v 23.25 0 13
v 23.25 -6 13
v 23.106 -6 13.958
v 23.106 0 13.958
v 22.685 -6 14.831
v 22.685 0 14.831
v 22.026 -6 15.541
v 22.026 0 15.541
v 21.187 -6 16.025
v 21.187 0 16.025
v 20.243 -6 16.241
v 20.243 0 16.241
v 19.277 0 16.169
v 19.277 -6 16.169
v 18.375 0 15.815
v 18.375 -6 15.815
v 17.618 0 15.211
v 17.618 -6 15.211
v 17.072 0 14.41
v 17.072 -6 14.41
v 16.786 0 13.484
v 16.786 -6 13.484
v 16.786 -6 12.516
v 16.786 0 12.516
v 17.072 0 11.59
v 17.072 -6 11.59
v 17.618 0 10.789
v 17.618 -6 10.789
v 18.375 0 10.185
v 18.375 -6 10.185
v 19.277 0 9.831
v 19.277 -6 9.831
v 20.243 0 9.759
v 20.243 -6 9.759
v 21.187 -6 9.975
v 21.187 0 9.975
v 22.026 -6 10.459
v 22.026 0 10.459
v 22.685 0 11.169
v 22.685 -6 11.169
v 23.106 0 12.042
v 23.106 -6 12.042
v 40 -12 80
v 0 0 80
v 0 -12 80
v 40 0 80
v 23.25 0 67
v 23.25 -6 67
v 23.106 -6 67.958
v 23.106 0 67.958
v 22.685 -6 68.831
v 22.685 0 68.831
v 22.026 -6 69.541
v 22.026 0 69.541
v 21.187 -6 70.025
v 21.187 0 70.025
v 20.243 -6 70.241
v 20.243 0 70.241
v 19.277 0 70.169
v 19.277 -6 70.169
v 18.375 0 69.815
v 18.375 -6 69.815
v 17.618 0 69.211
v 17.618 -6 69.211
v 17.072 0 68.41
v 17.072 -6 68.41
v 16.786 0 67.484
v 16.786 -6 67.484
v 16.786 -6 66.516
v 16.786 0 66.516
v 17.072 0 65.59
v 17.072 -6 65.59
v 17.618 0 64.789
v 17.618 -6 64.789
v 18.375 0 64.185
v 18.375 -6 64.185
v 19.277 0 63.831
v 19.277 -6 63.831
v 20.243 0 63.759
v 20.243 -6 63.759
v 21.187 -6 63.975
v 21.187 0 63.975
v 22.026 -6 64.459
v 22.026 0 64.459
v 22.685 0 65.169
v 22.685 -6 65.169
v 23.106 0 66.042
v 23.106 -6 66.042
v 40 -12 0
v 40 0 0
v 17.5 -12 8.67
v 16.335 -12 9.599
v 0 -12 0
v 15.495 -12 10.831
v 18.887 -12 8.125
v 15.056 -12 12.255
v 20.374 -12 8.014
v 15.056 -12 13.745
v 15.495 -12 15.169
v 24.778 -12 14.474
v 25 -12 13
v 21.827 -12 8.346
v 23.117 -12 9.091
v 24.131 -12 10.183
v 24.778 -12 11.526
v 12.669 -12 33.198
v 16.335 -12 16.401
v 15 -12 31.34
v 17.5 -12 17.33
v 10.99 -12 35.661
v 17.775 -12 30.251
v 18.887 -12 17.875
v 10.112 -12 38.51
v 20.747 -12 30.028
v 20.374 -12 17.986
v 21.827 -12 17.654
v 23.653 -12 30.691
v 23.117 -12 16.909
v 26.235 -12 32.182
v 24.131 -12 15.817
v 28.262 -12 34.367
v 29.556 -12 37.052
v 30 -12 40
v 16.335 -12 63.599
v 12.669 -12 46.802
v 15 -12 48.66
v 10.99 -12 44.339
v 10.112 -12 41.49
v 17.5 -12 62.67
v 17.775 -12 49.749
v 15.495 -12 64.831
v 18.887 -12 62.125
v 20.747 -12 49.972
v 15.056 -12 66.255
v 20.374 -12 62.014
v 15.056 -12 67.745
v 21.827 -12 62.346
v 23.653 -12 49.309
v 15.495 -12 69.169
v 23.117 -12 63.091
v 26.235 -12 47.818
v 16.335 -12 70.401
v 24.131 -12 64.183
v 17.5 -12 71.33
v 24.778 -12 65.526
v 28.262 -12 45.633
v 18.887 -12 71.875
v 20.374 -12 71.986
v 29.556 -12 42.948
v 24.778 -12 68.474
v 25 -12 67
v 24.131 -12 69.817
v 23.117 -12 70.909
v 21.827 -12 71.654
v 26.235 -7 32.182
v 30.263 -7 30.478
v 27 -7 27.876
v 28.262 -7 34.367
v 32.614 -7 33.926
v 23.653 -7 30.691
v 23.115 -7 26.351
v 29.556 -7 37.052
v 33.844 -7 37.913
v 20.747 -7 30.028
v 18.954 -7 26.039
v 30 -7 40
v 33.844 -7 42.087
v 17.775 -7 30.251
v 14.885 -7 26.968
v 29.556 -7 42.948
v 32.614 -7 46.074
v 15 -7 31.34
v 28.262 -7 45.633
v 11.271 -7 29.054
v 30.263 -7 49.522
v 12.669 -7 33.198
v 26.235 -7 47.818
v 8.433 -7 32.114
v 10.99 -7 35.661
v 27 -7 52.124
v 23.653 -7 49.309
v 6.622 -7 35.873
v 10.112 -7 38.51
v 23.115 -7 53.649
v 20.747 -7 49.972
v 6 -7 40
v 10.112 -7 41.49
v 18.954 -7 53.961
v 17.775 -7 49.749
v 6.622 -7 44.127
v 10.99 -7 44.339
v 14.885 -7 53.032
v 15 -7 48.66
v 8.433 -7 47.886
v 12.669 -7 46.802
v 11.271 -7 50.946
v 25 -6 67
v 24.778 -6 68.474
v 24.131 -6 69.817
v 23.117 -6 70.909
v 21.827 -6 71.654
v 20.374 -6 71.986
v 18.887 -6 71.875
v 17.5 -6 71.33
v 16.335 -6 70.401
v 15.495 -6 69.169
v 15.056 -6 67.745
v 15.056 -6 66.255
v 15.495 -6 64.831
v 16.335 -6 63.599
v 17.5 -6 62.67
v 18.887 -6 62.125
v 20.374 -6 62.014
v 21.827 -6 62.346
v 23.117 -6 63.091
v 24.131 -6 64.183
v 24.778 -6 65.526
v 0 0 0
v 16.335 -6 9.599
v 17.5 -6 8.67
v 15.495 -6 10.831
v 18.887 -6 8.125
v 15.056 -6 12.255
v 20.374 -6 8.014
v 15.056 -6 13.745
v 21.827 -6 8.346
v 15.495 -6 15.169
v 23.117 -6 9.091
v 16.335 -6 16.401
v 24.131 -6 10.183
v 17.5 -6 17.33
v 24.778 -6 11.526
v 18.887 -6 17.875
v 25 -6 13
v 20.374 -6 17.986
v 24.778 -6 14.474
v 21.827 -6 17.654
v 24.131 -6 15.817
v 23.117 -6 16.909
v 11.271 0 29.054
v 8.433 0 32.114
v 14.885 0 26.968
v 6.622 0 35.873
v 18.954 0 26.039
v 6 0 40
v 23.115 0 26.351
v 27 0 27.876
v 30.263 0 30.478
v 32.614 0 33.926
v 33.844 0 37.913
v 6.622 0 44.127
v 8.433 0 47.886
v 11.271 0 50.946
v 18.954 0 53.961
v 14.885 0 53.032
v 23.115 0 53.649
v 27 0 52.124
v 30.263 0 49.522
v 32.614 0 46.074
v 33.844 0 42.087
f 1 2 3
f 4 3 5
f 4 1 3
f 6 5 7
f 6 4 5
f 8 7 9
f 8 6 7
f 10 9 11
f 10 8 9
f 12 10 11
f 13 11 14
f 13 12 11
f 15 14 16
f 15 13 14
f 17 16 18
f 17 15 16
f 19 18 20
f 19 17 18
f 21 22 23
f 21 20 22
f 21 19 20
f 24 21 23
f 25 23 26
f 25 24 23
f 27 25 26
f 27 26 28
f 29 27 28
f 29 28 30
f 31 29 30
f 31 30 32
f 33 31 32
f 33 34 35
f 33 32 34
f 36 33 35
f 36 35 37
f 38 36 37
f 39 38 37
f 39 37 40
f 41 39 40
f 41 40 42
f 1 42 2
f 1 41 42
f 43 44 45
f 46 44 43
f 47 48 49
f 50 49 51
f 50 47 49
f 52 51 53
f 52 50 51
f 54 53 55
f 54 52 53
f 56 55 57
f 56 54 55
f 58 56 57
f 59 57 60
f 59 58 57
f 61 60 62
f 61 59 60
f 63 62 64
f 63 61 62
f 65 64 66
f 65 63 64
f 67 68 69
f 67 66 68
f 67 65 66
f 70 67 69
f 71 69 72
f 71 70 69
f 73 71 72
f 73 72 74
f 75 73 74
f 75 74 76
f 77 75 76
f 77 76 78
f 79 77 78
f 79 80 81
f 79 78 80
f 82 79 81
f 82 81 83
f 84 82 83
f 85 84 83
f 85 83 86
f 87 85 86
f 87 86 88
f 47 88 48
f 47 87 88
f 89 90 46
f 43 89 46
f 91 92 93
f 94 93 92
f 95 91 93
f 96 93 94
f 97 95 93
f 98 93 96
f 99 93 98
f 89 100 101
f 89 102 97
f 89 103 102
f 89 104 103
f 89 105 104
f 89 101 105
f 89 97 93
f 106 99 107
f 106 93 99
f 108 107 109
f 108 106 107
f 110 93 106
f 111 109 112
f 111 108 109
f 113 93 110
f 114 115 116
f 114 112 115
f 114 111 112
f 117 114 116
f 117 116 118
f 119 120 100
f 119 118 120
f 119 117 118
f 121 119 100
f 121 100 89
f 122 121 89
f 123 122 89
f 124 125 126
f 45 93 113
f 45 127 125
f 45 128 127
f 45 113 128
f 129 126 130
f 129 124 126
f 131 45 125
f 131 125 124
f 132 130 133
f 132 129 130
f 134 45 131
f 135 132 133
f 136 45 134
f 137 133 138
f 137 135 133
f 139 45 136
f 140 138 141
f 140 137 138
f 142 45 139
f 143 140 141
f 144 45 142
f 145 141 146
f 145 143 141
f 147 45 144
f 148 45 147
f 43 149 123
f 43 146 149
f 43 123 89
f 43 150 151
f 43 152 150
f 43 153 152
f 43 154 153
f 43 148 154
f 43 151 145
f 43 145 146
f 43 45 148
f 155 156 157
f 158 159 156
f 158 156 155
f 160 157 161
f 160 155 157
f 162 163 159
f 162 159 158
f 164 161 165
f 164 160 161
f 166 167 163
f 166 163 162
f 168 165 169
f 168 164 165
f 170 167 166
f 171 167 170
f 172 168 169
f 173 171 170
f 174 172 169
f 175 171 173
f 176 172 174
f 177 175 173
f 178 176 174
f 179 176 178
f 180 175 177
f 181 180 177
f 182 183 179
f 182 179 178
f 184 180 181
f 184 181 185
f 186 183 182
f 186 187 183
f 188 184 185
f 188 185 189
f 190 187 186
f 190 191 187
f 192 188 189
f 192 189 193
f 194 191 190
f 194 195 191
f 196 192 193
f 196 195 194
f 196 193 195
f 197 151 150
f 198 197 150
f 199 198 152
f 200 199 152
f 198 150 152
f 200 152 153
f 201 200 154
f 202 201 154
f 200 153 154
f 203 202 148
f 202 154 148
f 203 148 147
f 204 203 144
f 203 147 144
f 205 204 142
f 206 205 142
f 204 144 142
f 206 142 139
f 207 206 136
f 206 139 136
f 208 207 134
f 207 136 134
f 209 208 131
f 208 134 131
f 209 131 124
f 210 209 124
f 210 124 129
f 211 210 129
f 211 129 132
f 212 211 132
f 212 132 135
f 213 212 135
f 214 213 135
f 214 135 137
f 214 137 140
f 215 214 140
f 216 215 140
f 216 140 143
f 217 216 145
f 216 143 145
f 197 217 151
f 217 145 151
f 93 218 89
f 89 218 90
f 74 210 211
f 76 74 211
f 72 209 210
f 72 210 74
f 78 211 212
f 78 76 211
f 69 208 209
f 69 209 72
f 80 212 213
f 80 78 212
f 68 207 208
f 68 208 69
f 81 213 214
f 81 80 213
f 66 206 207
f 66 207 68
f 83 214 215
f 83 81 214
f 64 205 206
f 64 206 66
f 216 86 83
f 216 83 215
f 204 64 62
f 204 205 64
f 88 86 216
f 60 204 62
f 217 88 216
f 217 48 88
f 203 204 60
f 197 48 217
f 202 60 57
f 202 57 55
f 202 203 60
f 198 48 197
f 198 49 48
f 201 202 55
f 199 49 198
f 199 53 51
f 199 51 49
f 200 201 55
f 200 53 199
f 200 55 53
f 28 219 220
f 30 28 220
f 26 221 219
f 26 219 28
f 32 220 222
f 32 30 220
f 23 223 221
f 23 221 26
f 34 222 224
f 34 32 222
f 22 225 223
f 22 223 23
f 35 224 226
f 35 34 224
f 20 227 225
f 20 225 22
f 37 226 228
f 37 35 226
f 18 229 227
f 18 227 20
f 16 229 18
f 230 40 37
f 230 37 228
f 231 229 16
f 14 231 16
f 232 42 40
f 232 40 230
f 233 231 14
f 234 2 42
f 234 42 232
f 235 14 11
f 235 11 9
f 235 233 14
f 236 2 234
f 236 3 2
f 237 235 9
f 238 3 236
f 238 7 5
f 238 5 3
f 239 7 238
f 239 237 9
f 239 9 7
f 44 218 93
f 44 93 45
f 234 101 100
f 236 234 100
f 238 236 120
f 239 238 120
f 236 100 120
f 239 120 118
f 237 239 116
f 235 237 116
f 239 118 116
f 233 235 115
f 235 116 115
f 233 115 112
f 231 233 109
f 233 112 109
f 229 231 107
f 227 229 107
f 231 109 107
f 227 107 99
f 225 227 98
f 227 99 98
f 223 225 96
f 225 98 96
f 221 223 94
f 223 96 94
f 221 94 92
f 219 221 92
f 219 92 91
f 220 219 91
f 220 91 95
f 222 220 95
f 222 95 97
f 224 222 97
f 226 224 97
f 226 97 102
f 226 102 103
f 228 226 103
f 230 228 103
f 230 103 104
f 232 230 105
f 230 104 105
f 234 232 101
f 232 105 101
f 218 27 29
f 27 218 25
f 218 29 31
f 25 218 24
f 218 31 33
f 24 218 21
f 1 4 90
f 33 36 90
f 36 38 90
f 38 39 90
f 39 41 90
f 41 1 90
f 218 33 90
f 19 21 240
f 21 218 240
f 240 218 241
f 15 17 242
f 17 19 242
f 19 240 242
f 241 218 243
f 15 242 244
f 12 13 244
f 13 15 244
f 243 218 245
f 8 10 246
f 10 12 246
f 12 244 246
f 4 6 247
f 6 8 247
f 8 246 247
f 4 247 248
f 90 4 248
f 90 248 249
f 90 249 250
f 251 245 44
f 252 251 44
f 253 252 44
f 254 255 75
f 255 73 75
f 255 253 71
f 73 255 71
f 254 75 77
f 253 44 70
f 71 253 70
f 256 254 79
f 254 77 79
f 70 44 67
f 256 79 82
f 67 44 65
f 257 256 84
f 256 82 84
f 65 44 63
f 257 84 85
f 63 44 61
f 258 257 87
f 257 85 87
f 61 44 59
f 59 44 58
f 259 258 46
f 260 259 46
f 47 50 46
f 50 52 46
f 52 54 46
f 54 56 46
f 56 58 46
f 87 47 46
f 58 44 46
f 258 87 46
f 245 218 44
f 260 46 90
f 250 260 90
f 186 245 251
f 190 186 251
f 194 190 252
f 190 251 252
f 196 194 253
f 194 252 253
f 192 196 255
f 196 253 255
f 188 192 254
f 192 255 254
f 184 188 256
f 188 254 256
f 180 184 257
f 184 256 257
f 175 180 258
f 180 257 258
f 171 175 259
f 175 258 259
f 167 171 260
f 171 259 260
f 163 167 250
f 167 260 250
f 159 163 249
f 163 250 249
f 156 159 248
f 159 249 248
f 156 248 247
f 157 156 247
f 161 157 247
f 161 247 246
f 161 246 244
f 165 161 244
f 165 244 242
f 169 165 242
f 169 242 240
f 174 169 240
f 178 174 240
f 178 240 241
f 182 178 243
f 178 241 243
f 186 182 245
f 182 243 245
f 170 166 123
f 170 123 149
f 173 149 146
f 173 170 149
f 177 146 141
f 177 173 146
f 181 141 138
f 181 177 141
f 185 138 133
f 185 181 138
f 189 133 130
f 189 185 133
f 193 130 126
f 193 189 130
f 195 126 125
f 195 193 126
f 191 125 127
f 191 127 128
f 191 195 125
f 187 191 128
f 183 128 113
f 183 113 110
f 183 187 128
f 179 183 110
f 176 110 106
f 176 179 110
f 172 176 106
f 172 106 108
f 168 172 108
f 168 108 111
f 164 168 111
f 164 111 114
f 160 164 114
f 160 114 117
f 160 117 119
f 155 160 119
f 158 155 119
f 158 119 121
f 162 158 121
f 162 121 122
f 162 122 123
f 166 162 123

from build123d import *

# Parameters (mm, degrees)
F0_W     = 40
F0_H     = 80
F0_R     = 3.25
F0_R_2   = 10
F1_DEPTH = 12
F2_R     = 5
F3_DEPTH = 6
F4_R     = 14
F5_DEPTH = 7


with BuildPart() as f1:
    # F0 (on Front) → F1 (new body)
    with BuildSketch(Plane.XZ):
        with Locations((20, 40)):
            Rectangle(F0_W, F0_H)
        with Locations((20, 13)):
            Circle(F0_R, mode=Mode.SUBTRACT)
        with Locations((20, 40)):
            Circle(F0_R_2, mode=Mode.SUBTRACT)
        with Locations((20, 67)):
            Circle(F0_R, mode=Mode.SUBTRACT)
    extrude(amount=F1_DEPTH)

    # F2 (on face) → F3 (cut)
    with BuildSketch(Plane.XZ.offset(12)):
        with Locations((20, 67)):
            Circle(F2_R)
        with Locations((20, 13)):
            Circle(F2_R)
    extrude(amount=-F3_DEPTH, mode=Mode.SUBTRACT)

    # F4 (on face) → F5 (cut)
    with BuildSketch(Plane(origin=(0, 0, 0), x_dir=(-1, 0, 0), z_dir=(0, 1, 0))):
        with Locations((-20, 40)):
            Circle(F4_R)
    extrude(amount=-F5_DEPTH, mode=Mode.SUBTRACT)


solid = f1.part
